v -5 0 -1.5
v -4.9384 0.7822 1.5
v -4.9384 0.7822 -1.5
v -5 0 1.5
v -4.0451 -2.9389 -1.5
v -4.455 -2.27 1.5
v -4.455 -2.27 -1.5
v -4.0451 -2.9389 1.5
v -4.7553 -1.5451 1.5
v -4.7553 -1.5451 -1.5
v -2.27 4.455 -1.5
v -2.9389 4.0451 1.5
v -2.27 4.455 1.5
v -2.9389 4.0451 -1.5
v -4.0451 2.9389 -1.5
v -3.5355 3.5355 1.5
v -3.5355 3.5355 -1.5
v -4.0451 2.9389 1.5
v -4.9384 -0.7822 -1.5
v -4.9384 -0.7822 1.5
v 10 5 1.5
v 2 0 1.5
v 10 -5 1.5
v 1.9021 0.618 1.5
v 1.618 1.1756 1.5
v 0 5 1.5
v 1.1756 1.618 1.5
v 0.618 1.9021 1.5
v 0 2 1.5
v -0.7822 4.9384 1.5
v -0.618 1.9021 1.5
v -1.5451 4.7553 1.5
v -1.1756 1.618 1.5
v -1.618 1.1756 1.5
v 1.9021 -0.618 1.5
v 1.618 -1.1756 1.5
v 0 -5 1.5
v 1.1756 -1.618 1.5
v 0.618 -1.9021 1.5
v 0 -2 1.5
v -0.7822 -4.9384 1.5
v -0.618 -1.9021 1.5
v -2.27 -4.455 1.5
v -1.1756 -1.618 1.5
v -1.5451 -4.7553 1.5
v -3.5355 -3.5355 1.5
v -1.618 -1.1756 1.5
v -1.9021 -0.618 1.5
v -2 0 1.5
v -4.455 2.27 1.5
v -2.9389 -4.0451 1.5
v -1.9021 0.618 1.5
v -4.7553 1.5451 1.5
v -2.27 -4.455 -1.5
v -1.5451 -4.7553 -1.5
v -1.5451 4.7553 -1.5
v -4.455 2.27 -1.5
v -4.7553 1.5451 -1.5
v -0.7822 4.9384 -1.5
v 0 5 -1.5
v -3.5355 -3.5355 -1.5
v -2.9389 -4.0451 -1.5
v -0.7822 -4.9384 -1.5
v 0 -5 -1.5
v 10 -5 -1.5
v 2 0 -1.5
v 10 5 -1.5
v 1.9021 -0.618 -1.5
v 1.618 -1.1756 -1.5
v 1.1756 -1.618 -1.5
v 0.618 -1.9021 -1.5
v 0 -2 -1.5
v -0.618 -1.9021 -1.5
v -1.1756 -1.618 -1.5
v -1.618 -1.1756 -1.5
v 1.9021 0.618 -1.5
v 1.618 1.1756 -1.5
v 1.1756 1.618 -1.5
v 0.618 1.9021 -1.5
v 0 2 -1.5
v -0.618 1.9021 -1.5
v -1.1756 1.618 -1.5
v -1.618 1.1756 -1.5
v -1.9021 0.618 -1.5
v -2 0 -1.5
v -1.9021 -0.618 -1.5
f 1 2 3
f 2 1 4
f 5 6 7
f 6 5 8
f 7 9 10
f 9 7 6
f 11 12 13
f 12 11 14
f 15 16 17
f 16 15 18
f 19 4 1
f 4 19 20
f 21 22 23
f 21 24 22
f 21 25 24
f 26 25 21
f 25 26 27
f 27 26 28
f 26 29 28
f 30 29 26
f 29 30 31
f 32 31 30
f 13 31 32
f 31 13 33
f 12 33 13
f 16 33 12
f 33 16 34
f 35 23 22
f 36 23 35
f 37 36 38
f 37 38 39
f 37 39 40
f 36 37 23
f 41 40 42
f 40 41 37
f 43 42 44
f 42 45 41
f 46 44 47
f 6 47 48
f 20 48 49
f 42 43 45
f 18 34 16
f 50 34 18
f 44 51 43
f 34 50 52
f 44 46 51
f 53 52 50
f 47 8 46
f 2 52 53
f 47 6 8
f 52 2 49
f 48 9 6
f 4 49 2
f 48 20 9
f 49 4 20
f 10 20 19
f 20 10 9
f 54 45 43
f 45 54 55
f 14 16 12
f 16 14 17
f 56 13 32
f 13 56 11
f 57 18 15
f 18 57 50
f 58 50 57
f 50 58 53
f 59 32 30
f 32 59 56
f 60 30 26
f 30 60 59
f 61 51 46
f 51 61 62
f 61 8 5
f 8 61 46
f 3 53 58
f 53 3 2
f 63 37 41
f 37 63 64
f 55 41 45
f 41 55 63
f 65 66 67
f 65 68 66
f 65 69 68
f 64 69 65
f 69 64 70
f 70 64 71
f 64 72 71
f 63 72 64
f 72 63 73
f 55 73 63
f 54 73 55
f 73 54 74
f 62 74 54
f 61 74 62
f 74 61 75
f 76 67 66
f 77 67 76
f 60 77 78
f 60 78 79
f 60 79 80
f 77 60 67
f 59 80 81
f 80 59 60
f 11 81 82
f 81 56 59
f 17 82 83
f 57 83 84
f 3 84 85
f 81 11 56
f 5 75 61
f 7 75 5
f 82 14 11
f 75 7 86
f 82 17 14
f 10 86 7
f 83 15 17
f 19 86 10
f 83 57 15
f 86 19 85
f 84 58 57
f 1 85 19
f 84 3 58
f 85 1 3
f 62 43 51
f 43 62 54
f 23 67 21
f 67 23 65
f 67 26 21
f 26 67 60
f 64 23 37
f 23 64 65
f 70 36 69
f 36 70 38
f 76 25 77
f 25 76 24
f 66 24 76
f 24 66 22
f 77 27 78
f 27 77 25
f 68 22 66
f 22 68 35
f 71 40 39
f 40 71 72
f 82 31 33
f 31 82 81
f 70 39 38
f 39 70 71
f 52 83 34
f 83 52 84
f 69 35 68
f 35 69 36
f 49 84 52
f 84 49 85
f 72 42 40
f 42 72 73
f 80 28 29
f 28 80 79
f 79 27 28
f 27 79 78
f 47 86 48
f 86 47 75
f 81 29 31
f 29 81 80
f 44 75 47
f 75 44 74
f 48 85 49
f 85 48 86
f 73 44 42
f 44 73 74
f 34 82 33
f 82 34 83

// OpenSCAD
width = 10;
thickness = 3;
difference(){
	union(){
		cylinder( thickness ,width/2, width/2, center=true, $fn=40);
		translate([width/2, 0, 0])cube([width, width, thickness], center=true);
	};
	cylinder( 2*thickness, 2, 2, center=true, $fn=20);
};
